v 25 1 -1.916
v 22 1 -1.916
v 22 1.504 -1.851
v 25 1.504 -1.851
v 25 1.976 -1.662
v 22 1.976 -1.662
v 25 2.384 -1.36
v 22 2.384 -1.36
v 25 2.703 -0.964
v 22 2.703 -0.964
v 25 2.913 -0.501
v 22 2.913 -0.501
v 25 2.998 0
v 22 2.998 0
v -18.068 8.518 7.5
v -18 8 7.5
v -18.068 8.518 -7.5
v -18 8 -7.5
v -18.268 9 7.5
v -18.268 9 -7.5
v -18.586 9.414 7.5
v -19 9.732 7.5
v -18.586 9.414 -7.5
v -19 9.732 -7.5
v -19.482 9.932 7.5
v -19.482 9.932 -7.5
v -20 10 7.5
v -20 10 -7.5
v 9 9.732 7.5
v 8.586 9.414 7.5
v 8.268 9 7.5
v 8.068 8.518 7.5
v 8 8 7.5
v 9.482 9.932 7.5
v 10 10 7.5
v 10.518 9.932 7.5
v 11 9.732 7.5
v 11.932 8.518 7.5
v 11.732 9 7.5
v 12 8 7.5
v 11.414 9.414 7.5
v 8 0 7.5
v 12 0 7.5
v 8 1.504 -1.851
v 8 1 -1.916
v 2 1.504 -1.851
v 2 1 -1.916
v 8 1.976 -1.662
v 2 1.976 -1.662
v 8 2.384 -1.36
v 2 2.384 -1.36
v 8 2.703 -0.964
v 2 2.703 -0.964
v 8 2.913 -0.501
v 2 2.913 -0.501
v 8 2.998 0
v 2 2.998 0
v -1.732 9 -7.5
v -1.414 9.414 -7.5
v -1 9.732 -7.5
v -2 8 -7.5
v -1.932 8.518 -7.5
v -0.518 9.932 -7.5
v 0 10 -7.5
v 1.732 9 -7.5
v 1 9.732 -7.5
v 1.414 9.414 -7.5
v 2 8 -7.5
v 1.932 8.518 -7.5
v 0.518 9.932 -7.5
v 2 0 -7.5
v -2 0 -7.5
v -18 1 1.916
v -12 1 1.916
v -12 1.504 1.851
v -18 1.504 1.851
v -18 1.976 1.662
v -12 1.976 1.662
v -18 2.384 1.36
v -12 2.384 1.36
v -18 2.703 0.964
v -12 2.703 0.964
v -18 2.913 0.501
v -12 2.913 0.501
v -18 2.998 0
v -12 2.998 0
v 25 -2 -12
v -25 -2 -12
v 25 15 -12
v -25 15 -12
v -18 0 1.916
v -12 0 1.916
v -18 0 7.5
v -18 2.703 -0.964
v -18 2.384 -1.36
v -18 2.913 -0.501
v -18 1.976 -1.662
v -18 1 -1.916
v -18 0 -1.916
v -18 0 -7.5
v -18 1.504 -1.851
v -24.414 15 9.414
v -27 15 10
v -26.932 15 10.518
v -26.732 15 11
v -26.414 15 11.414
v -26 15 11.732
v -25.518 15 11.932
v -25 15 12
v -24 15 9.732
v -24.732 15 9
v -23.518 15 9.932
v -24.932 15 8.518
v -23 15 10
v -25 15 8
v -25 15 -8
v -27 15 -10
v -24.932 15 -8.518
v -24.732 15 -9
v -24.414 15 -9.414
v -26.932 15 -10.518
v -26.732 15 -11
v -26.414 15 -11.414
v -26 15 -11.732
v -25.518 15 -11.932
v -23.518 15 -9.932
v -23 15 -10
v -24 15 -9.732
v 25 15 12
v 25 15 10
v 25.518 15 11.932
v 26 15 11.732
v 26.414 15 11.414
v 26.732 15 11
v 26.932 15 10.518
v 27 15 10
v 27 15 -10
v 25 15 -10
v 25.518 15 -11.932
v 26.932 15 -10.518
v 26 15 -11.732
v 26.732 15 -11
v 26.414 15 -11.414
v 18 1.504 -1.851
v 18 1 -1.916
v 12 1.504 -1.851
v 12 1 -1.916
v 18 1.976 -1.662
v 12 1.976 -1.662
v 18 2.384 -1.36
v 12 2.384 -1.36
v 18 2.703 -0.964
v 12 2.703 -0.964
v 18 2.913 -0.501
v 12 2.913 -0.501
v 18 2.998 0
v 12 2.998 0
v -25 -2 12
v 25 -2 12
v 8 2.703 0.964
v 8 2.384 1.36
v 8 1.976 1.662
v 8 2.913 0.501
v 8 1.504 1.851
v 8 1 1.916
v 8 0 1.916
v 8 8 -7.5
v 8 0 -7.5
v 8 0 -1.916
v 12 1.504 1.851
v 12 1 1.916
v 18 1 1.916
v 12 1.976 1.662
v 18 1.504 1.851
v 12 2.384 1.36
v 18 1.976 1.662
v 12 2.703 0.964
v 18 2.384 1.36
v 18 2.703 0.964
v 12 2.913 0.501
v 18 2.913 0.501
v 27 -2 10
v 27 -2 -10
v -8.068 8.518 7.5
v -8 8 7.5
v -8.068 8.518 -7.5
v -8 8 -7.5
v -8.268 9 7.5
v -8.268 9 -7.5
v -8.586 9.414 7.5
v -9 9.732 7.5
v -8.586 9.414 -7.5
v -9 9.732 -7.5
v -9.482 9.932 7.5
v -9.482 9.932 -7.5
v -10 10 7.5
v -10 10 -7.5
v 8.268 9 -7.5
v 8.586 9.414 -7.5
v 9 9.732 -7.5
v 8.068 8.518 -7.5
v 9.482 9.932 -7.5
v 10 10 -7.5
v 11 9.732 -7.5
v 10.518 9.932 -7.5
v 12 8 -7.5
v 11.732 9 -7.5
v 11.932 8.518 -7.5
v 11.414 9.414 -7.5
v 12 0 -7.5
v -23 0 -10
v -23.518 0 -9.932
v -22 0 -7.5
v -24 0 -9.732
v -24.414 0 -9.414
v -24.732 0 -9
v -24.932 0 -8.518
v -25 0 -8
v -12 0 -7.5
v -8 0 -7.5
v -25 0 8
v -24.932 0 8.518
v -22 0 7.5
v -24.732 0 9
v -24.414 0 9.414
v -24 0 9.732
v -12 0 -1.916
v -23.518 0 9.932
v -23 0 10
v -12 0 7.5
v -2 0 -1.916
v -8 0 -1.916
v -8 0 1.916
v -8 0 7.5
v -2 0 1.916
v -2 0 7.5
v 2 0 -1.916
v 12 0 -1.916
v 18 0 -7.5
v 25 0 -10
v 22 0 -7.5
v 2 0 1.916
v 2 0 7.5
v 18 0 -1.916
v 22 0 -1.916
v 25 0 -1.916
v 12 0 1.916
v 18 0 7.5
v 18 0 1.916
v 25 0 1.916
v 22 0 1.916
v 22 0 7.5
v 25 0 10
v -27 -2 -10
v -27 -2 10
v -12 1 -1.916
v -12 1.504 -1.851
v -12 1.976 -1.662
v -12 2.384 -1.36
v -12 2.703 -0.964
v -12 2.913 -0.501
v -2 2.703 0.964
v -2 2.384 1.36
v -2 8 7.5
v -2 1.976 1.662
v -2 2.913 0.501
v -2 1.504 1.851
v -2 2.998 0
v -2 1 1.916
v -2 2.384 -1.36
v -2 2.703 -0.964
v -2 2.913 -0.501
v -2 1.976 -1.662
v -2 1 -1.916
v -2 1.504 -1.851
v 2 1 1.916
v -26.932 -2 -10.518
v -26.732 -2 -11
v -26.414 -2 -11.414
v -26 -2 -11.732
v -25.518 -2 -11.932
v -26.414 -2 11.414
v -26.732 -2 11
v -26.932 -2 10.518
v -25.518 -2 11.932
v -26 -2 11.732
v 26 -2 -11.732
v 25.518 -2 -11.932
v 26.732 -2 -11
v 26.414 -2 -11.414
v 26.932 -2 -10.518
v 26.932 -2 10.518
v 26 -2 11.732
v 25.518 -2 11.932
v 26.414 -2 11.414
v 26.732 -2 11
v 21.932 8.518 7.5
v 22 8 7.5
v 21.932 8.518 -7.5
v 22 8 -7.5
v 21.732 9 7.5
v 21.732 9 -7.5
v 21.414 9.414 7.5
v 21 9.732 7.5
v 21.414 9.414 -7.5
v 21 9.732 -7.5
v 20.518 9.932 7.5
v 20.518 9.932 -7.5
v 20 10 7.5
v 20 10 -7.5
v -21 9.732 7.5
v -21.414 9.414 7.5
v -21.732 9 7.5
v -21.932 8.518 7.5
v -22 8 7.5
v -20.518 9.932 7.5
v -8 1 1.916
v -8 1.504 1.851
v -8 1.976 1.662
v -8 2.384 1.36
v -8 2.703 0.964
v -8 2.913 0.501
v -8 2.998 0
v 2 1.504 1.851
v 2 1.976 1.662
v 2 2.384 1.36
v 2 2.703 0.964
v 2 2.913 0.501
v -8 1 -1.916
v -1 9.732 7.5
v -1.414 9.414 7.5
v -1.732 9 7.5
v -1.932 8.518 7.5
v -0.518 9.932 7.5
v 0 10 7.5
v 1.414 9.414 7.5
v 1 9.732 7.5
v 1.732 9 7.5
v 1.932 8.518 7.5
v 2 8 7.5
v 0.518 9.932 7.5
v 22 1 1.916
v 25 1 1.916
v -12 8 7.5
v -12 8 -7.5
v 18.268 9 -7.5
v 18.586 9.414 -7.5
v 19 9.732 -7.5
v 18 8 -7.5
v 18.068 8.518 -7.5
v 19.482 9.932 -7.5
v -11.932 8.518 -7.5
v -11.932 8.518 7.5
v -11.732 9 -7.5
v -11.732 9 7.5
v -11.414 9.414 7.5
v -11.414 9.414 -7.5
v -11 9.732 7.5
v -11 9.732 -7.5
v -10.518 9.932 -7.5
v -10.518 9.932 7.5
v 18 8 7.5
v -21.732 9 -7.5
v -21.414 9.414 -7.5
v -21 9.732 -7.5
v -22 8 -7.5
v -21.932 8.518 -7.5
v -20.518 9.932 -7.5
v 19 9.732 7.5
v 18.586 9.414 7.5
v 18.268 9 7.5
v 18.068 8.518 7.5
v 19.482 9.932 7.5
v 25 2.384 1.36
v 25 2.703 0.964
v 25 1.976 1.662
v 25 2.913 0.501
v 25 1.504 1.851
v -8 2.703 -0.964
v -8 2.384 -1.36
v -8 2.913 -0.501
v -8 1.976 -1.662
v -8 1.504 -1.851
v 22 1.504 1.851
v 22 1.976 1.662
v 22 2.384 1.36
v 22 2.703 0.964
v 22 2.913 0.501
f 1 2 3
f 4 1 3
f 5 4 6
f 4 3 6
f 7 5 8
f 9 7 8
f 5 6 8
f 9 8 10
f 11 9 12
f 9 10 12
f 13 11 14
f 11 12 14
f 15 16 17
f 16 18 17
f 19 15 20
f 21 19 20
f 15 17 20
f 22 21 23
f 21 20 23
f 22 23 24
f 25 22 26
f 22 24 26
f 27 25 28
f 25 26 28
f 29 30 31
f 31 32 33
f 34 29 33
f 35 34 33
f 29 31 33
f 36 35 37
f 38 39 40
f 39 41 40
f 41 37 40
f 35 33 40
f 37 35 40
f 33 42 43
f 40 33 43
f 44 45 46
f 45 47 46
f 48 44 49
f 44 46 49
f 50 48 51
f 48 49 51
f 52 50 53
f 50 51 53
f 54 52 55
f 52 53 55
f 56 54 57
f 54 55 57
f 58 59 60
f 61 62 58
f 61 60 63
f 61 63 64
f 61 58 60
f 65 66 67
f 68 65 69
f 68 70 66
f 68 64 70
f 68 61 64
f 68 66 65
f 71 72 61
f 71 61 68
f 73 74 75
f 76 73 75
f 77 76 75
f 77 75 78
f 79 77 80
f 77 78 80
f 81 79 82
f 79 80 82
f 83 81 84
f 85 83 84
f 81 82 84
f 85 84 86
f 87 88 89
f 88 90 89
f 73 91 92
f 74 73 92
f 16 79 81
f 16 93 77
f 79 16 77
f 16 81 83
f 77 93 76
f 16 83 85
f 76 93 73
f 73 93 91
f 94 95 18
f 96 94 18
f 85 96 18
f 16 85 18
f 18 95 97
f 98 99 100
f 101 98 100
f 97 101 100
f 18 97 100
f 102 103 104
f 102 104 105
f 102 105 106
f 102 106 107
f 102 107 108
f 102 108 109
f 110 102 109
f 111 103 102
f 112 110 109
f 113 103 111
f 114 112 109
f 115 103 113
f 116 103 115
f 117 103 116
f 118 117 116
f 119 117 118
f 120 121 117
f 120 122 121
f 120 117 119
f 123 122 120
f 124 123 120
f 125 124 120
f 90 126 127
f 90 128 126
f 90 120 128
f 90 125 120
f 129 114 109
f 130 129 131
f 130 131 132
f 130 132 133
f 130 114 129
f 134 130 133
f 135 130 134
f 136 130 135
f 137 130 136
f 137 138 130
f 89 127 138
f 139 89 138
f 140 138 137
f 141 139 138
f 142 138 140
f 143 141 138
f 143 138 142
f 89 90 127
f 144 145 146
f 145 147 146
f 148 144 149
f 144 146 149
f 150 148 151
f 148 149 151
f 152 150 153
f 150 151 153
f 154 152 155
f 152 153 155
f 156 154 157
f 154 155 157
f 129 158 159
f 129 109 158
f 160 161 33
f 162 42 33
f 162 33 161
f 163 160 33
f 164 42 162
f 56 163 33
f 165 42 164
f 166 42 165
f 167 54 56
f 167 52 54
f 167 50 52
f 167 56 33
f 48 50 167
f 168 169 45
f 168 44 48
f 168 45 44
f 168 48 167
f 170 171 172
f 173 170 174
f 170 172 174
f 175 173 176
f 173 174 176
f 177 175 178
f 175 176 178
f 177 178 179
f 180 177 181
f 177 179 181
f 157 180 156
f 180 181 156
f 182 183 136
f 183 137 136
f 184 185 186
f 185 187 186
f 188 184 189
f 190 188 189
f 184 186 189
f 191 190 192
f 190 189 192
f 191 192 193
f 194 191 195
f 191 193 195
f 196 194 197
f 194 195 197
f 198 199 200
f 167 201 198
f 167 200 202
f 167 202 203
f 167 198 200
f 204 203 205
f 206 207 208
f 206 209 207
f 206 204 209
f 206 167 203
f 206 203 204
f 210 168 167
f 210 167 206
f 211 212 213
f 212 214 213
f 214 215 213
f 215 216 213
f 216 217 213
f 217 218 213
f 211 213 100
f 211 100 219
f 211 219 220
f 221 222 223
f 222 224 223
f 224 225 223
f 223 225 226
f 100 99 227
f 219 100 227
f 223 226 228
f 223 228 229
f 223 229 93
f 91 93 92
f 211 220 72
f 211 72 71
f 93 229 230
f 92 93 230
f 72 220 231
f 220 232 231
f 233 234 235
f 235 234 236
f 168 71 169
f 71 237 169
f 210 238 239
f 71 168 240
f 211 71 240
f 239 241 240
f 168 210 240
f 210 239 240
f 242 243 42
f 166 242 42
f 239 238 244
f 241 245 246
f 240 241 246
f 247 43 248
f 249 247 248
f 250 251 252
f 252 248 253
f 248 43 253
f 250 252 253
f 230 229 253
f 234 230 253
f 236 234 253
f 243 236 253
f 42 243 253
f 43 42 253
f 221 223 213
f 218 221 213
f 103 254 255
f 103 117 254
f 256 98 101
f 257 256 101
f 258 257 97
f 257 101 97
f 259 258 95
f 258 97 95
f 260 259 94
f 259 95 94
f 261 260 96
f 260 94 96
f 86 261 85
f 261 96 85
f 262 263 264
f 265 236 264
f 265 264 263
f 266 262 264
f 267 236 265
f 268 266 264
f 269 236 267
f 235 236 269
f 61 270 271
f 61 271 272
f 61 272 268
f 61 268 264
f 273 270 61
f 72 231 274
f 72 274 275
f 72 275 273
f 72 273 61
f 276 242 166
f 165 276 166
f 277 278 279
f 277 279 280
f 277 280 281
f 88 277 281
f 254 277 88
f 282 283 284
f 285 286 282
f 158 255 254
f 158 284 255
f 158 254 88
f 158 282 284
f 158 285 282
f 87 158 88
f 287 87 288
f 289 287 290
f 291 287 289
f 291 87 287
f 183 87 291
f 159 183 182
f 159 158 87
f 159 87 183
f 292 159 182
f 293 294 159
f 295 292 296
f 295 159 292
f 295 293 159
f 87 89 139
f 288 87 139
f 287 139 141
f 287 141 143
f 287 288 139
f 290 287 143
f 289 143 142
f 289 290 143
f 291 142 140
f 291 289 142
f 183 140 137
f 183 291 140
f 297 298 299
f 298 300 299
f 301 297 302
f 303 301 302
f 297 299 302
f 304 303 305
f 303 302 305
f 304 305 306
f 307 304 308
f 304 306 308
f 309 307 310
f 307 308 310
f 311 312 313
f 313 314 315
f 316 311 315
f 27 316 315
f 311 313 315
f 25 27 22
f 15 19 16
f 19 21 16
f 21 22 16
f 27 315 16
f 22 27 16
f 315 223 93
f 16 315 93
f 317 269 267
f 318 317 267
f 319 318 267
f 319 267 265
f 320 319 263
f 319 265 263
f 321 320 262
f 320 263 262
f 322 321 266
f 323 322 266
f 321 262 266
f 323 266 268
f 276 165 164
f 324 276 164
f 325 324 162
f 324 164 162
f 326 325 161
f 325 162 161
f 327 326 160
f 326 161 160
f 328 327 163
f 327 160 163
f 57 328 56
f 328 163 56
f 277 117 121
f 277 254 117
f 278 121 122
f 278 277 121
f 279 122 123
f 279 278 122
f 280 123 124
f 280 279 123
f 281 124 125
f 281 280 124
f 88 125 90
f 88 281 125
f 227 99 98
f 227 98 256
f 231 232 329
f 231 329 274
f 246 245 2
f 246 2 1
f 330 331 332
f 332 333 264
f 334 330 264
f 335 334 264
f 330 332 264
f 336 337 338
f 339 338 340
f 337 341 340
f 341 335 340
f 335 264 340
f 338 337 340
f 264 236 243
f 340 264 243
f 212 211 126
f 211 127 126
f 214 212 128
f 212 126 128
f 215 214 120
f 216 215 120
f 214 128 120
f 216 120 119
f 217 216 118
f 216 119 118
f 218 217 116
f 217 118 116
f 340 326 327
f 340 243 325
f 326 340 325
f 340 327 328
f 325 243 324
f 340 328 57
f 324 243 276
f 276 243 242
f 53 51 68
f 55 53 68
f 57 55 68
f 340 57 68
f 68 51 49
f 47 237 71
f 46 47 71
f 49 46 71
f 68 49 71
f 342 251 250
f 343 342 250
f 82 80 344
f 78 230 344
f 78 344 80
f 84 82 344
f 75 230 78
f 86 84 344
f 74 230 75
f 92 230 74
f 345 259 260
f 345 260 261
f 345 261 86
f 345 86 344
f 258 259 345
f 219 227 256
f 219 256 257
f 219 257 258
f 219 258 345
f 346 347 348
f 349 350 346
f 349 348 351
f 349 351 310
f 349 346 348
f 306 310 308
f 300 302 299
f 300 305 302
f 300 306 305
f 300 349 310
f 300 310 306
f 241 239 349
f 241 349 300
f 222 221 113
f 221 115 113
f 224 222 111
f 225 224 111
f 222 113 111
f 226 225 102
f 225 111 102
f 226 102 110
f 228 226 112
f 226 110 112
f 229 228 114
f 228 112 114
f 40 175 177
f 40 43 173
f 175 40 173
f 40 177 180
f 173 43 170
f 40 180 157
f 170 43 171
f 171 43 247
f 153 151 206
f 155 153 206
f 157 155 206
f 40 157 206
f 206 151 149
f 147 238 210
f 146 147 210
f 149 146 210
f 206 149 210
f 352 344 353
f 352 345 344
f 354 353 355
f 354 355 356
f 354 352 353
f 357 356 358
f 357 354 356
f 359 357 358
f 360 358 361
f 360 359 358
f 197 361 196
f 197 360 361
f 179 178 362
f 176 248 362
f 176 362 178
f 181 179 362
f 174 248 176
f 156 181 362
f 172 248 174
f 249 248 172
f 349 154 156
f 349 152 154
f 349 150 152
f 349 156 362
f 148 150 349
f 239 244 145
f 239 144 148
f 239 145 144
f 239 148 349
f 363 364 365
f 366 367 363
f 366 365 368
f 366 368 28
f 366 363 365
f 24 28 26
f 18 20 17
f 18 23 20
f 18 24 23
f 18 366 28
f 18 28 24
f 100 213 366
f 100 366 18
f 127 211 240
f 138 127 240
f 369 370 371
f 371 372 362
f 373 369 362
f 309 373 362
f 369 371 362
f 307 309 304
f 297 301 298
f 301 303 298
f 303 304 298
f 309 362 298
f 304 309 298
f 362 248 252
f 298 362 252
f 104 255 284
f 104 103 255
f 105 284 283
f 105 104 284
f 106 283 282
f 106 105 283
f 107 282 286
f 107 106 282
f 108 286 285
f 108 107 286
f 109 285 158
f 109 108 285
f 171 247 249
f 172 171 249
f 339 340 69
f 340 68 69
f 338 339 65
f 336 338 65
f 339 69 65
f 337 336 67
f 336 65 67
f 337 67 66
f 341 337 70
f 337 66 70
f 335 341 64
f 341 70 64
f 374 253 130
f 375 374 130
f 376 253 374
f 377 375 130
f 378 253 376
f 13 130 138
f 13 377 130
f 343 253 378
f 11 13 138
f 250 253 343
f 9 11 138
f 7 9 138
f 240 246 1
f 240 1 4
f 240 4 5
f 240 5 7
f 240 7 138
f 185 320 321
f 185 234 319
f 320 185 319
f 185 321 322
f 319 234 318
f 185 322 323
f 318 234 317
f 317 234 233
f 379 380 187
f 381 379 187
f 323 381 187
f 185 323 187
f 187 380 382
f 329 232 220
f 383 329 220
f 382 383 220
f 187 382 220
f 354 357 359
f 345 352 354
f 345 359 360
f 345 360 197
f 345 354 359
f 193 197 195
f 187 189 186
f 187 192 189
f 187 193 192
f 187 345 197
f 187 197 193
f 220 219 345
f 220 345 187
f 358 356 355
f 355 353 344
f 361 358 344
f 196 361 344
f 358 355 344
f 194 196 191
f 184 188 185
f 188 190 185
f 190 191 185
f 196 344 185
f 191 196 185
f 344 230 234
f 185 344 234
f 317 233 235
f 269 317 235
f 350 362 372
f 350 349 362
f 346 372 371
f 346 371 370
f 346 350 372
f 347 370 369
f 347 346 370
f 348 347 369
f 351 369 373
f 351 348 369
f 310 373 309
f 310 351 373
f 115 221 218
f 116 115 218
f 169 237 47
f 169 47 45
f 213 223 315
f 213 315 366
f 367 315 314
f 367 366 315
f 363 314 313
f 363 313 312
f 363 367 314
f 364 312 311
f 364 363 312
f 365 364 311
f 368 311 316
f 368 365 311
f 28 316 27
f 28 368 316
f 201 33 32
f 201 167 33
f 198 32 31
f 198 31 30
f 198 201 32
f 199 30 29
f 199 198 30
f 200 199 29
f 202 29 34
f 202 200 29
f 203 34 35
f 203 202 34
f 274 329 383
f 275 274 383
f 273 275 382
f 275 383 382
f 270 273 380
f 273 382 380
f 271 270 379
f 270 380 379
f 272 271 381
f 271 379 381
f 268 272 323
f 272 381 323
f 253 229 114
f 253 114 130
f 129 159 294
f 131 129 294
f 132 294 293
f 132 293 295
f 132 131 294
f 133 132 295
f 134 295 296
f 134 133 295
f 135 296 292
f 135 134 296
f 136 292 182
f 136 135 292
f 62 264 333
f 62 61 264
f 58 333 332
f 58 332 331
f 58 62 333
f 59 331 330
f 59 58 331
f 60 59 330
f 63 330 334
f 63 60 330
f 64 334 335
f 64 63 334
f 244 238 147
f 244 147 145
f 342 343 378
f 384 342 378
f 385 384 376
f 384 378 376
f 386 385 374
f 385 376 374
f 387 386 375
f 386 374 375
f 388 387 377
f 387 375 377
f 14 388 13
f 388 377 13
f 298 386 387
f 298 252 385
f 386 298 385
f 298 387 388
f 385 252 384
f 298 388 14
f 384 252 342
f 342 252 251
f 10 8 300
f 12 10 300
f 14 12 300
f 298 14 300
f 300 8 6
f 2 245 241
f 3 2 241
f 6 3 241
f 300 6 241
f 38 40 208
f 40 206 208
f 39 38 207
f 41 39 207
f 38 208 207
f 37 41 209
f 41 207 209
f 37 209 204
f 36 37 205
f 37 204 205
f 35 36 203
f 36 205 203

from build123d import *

# Parameters (mm, degrees)
CROQUIS7_W               = 54
CROQUIS7_H               = 24
CROQUIS7_W_2             = 50
CROQUIS7_H_2             = 20
SALIENTE_EXTRUIR7_DEPTH  = 15
CROQUIS8_W               = 54
CROQUIS8_H               = 24
SALIENTE_EXTRUIR8_DEPTH  = 2
CROQUIS9_W               = 4
CROQUIS9_H               = 15
SALIENTE_EXTRUIR10_DEPTH = 10
MATRIZL1_COUNT           = 5
MATRIZL1_PITCH           = 10
CROQUIS10_W              = 47
CROQUIS10_H              = 3.83204255
SALIENTE_EXTRUIR11_DEPTH = 3
REDONDEO1_R              = 2
REDONDEO2_R              = 2
REDONDEO3_R              = 2
REDONDEO4_R              = 2


# Some blends are built 0.0001 mm under size
with BuildPart() as part:
    # Croquis7 → Saliente-Extruir7 (new body)
    with BuildSketch(Plane(origin=(0, 0, 0), x_dir=(1, 0, 0), z_dir=(0, 1, 0))):
        Rectangle(CROQUIS7_W, CROQUIS7_H)
        Rectangle(CROQUIS7_W_2, CROQUIS7_H_2, mode=Mode.SUBTRACT)
    extrude(amount=SALIENTE_EXTRUIR7_DEPTH)

    # Croquis8 → Saliente-Extruir8 (add)
    with BuildSketch(Plane.XZ):
        Rectangle(CROQUIS8_W, CROQUIS8_H)
    extrude(amount=SALIENTE_EXTRUIR8_DEPTH)

    # Croquis9 → Saliente-Extruir10 (add)
    with BuildSketch(Plane(origin=(0, 0, 0), x_dir=(1, 0, 0), z_dir=(0, 1, 0))):
        with Locations((-20, 0)):
            Rectangle(CROQUIS9_W, CROQUIS9_H)
    saliente_extruir10 = extrude(amount=SALIENTE_EXTRUIR10_DEPTH)

    # MatrizL1: Saliente-Extruir10 ×5
    with Locations(*[(i * MATRIZL1_PITCH, 0, 0) for i in range(1, MATRIZL1_COUNT)]):
        add(saliente_extruir10)

    # Croquis10 → Saliente-Extruir11 (add)
    with BuildSketch(Plane(origin=(0, 0, 0), x_dir=(1, 0, 0), z_dir=(0, 1, 0))):
        with Locations((1.5, 0)):
            Rectangle(CROQUIS10_W, CROQUIS10_H)
    extrude(amount=SALIENTE_EXTRUIR11_DEPTH)

    # Redondeo1
    # the kernel refuses this fillet: 2 mm, written as the material it takes off along each edge
    with BuildSketch(Plane(origin=(25, 3, 1.916021275), x_dir=(0, 0, -1), z_dir=(-1, 0, 0))) as redondeo1_piece_1:
        with BuildLine():
            CenterArc((REDONDEO1_R, REDONDEO1_R), REDONDEO1_R, 180, 90)
            Line((0, REDONDEO1_R), (0, 0))
            Line((0, 0), (REDONDEO1_R, 0))
        make_face()
    extrude(amount=3, mode=Mode.SUBTRACT)
    with BuildSketch(Plane(origin=(30, 3, 1.916021275), x_dir=(0, 0, -1), z_dir=(-1, 0, 0))) as redondeo1_piece_2_section:
        with BuildLine():
            CenterArc((REDONDEO1_R, REDONDEO1_R), REDONDEO1_R, 180, 90)
            Line((0, REDONDEO1_R), (0, 0))
            Line((0, 0), (REDONDEO1_R, 0))
        make_face()
    redondeo1_piece_2 = extrude(amount=13, mode=Mode.PRIVATE)
    redondeo1_piece_2 = split(redondeo1_piece_2, bisect_by=Plane(origin=(18, 2.553264122, 1.469285397), z_dir=(-1, 0, 0)), keep=Keep.TOP, mode=Mode.PRIVATE)
    add(redondeo1_piece_2, mode=Mode.SUBTRACT)
    with BuildSketch(Plane(origin=(17, 3, -1.916021275), x_dir=(0, -1, 0), z_dir=(1, 0, 0))) as redondeo1_piece_3_section:
        with BuildLine():
            CenterArc((REDONDEO1_R, -REDONDEO1_R), REDONDEO1_R, 90, 90)
            Line((0, -REDONDEO1_R), (0, 0))
            Line((0, 0), (REDONDEO1_R, 0))
        make_face()
    redondeo1_piece_3 = extrude(amount=13, mode=Mode.PRIVATE)
    redondeo1_piece_3 = split(redondeo1_piece_3, bisect_by=Plane(origin=(18, 2.553264122, -1.469285397), z_dir=(-1, 0, 0)), keep=Keep.TOP, mode=Mode.PRIVATE)
    add(redondeo1_piece_3, mode=Mode.SUBTRACT)
    with BuildSketch(Plane(origin=(22, 3, -1.916021275), x_dir=(0, -1, 0), z_dir=(1, 0, 0))) as redondeo1_piece_4:
        with BuildLine():
            CenterArc((REDONDEO1_R, -REDONDEO1_R), REDONDEO1_R, 90, 90)
            Line((0, -REDONDEO1_R), (0, 0))
            Line((0, 0), (REDONDEO1_R, 0))
        make_face()
    extrude(amount=3, mode=Mode.SUBTRACT)
    with BuildSketch(Plane(origin=(7, 3, -1.916021275), x_dir=(0, -1, 0), z_dir=(1, 0, 0))) as redondeo1_piece_5_section:
        with BuildLine():
            CenterArc((REDONDEO1_R, -REDONDEO1_R), REDONDEO1_R, 90, 90)
            Line((0, -REDONDEO1_R), (0, 0))
            Line((0, 0), (REDONDEO1_R, 0))
        make_face()
    redondeo1_piece_5 = extrude(amount=16, mode=Mode.PRIVATE)
    redondeo1_piece_5 = split(redondeo1_piece_5, bisect_by=Plane(origin=(8, 2.553264122, -1.469285397), z_dir=(-1, 0, 0)), keep=Keep.TOP, mode=Mode.PRIVATE)
    add(redondeo1_piece_5, mode=Mode.SUBTRACT)
    with BuildSketch(Plane(origin=(12, 3, -1.916021275), x_dir=(0, -1, 0), z_dir=(1, 0, 0)), Plane(origin=(2, 3, -1.916021275), x_dir=(0, -1, 0), z_dir=(1, 0, 0)), Plane(origin=(-8, 3, -1.916021275), x_dir=(0, -1, 0), z_dir=(1, 0, 0)), Plane(origin=(-18, 3, -1.916021275), x_dir=(0, -1, 0), z_dir=(1, 0, 0))) as redondeo1_piece_6:
        with BuildLine():
            CenterArc((REDONDEO1_R, -REDONDEO1_R), REDONDEO1_R, 90, 90)
            Line((0, -REDONDEO1_R), (0, 0))
            Line((0, 0), (REDONDEO1_R, 0))
        make_face()
    extrude(amount=6, mode=Mode.SUBTRACT)
    with BuildSketch(Plane(origin=(7, 3, -1.916021275), x_dir=(0, -1, 0), z_dir=(1, 0, 0))) as redondeo1_piece_7_section:
        with BuildLine():
            CenterArc((REDONDEO1_R, -REDONDEO1_R), REDONDEO1_R, 90, 90)
            Line((0, -REDONDEO1_R), (0, 0))
            Line((0, 0), (REDONDEO1_R, 0))
        make_face()
    redondeo1_piece_7 = extrude(amount=16, mode=Mode.PRIVATE)
    redondeo1_piece_7 = split(redondeo1_piece_7, bisect_by=Plane(origin=(22, 2.553264122, -1.469285397), z_dir=(1, 0, 0)), keep=Keep.TOP, mode=Mode.PRIVATE)
    add(redondeo1_piece_7, mode=Mode.SUBTRACT)
    with BuildSketch(Plane(origin=(23, 3, 1.916021275), x_dir=(0, 0, -1), z_dir=(-1, 0, 0))) as redondeo1_piece_8_section:
        with BuildLine():
            CenterArc((REDONDEO1_R, REDONDEO1_R), REDONDEO1_R, 180, 90)
            Line((0, REDONDEO1_R), (0, 0))
            Line((0, 0), (REDONDEO1_R, 0))
        make_face()
    redondeo1_piece_8 = extrude(amount=16, mode=Mode.PRIVATE)
    redondeo1_piece_8 = split(redondeo1_piece_8, bisect_by=Plane(origin=(22, 2.553264122, 1.469285397), z_dir=(1, 0, 0)), keep=Keep.TOP, mode=Mode.PRIVATE)
    add(redondeo1_piece_8, mode=Mode.SUBTRACT)
    with BuildSketch(Plane(origin=(18, 3, 1.916021275), x_dir=(0, 0, -1), z_dir=(-1, 0, 0)), Plane(origin=(8, 3, 1.916021275), x_dir=(0, 0, -1), z_dir=(-1, 0, 0)), Plane(origin=(-2, 3, 1.916021275), x_dir=(0, 0, -1), z_dir=(-1, 0, 0)), Plane(origin=(-12, 3, 1.916021275), x_dir=(0, 0, -1), z_dir=(-1, 0, 0))) as redondeo1_piece_9:
        with BuildLine():
            CenterArc((REDONDEO1_R, REDONDEO1_R), REDONDEO1_R, 180, 90)
            Line((0, REDONDEO1_R), (0, 0))
            Line((0, 0), (REDONDEO1_R, 0))
        make_face()
    extrude(amount=6, mode=Mode.SUBTRACT)
    with BuildSketch(Plane(origin=(23, 3, 1.916021275), x_dir=(0, 0, -1), z_dir=(-1, 0, 0))) as redondeo1_piece_10_section:
        with BuildLine():
            CenterArc((REDONDEO1_R, REDONDEO1_R), REDONDEO1_R, 180, 90)
            Line((0, REDONDEO1_R), (0, 0))
            Line((0, 0), (REDONDEO1_R, 0))
        make_face()
    redondeo1_piece_10 = extrude(amount=16, mode=Mode.PRIVATE)
    redondeo1_piece_10 = split(redondeo1_piece_10, bisect_by=Plane(origin=(8, 2.553264122, 1.469285397), z_dir=(-1, 0, 0)), keep=Keep.TOP, mode=Mode.PRIVATE)
    add(redondeo1_piece_10, mode=Mode.SUBTRACT)
    with BuildSketch(Plane(origin=(13, 3, 1.916021275), x_dir=(0, 0, -1), z_dir=(-1, 0, 0))) as redondeo1_piece_11_section:
        with BuildLine():
            CenterArc((REDONDEO1_R, REDONDEO1_R), REDONDEO1_R, 180, 90)
            Line((0, REDONDEO1_R), (0, 0))
            Line((0, 0), (REDONDEO1_R, 0))
        make_face()
    redondeo1_piece_11 = extrude(amount=16, mode=Mode.PRIVATE)
    redondeo1_piece_11 = split(redondeo1_piece_11, bisect_by=Plane(origin=(12, 2.553264122, 1.469285397), z_dir=(1, 0, 0)), keep=Keep.TOP, mode=Mode.PRIVATE)
    add(redondeo1_piece_11, mode=Mode.SUBTRACT)
    with BuildSketch(Plane(origin=(13, 3, 1.916021275), x_dir=(0, 0, -1), z_dir=(-1, 0, 0))) as redondeo1_piece_12_section:
        with BuildLine():
            CenterArc((REDONDEO1_R, REDONDEO1_R), REDONDEO1_R, 180, 90)
            Line((0, REDONDEO1_R), (0, 0))
            Line((0, 0), (REDONDEO1_R, 0))
        make_face()
    redondeo1_piece_12 = extrude(amount=16, mode=Mode.PRIVATE)
    redondeo1_piece_12 = split(redondeo1_piece_12, bisect_by=Plane(origin=(-2, 2.553264122, 1.469285397), z_dir=(-1, 0, 0)), keep=Keep.TOP, mode=Mode.PRIVATE)
    add(redondeo1_piece_12, mode=Mode.SUBTRACT)
    with BuildSketch(Plane(origin=(-3, 3, -1.916021275), x_dir=(0, -1, 0), z_dir=(1, 0, 0))) as redondeo1_piece_13_section:
        with BuildLine():
            CenterArc((REDONDEO1_R, -REDONDEO1_R), REDONDEO1_R, 90, 90)
            Line((0, -REDONDEO1_R), (0, 0))
            Line((0, 0), (REDONDEO1_R, 0))
        make_face()
    redondeo1_piece_13 = extrude(amount=16, mode=Mode.PRIVATE)
    redondeo1_piece_13 = split(redondeo1_piece_13, bisect_by=Plane(origin=(-2, 2.553264122, -1.469285397), z_dir=(-1, 0, 0)), keep=Keep.TOP, mode=Mode.PRIVATE)
    add(redondeo1_piece_13, mode=Mode.SUBTRACT)
    with BuildSketch(Plane(origin=(-3, 3, -1.916021275), x_dir=(0, -1, 0), z_dir=(1, 0, 0))) as redondeo1_piece_14_section:
        with BuildLine():
            CenterArc((REDONDEO1_R, -REDONDEO1_R), REDONDEO1_R, 90, 90)
            Line((0, -REDONDEO1_R), (0, 0))
            Line((0, 0), (REDONDEO1_R, 0))
        make_face()
    redondeo1_piece_14 = extrude(amount=16, mode=Mode.PRIVATE)
    redondeo1_piece_14 = split(redondeo1_piece_14, bisect_by=Plane(origin=(12, 2.553264122, -1.469285397), z_dir=(1, 0, 0)), keep=Keep.TOP, mode=Mode.PRIVATE)
    add(redondeo1_piece_14, mode=Mode.SUBTRACT)
    with BuildSketch(Plane(origin=(3, 3, 1.916021275), x_dir=(0, 0, -1), z_dir=(-1, 0, 0))) as redondeo1_piece_15_section:
        with BuildLine():
            CenterArc((REDONDEO1_R, REDONDEO1_R), REDONDEO1_R, 180, 90)
            Line((0, REDONDEO1_R), (0, 0))
            Line((0, 0), (REDONDEO1_R, 0))
        make_face()
    redondeo1_piece_15 = extrude(amount=16, mode=Mode.PRIVATE)
    redondeo1_piece_15 = split(redondeo1_piece_15, bisect_by=Plane(origin=(2, 2.553264122, 1.469285397), z_dir=(1, 0, 0)), keep=Keep.TOP, mode=Mode.PRIVATE)
    add(redondeo1_piece_15, mode=Mode.SUBTRACT)
    with BuildSketch(Plane(origin=(3, 3, 1.916021275), x_dir=(0, 0, -1), z_dir=(-1, 0, 0))) as redondeo1_piece_16_section:
        with BuildLine():
            CenterArc((REDONDEO1_R, REDONDEO1_R), REDONDEO1_R, 180, 90)
            Line((0, REDONDEO1_R), (0, 0))
            Line((0, 0), (REDONDEO1_R, 0))
        make_face()
    redondeo1_piece_16 = extrude(amount=16, mode=Mode.PRIVATE)
    redondeo1_piece_16 = split(redondeo1_piece_16, bisect_by=Plane(origin=(-12, 2.553264122, 1.469285397), z_dir=(-1, 0, 0)), keep=Keep.TOP, mode=Mode.PRIVATE)
    add(redondeo1_piece_16, mode=Mode.SUBTRACT)
    with BuildSketch(Plane(origin=(-13, 3, -1.916021275), x_dir=(0, -1, 0), z_dir=(1, 0, 0))) as redondeo1_piece_17_section:
        with BuildLine():
            CenterArc((REDONDEO1_R, -REDONDEO1_R), REDONDEO1_R, 90, 90)
            Line((0, -REDONDEO1_R), (0, 0))
            Line((0, 0), (REDONDEO1_R, 0))
        make_face()
    redondeo1_piece_17 = extrude(amount=16, mode=Mode.PRIVATE)
    redondeo1_piece_17 = split(redondeo1_piece_17, bisect_by=Plane(origin=(-12, 2.553264122, -1.469285397), z_dir=(-1, 0, 0)), keep=Keep.TOP, mode=Mode.PRIVATE)
    add(redondeo1_piece_17, mode=Mode.SUBTRACT)
    with BuildSketch(Plane(origin=(-13, 3, -1.916021275), x_dir=(0, -1, 0), z_dir=(1, 0, 0))) as redondeo1_piece_18_section:
        with BuildLine():
            CenterArc((REDONDEO1_R, -REDONDEO1_R), REDONDEO1_R, 90, 90)
            Line((0, -REDONDEO1_R), (0, 0))
            Line((0, 0), (REDONDEO1_R, 0))
        make_face()
    redondeo1_piece_18 = extrude(amount=16, mode=Mode.PRIVATE)
    redondeo1_piece_18 = split(redondeo1_piece_18, bisect_by=Plane(origin=(2, 2.553264122, -1.469285397), z_dir=(1, 0, 0)), keep=Keep.TOP, mode=Mode.PRIVATE)
    add(redondeo1_piece_18, mode=Mode.SUBTRACT)
    with BuildSketch(Plane(origin=(-23, 3, -1.916021275), x_dir=(0, -1, 0), z_dir=(1, 0, 0))) as redondeo1_piece_19_section:
        with BuildLine():
            CenterArc((REDONDEO1_R, -REDONDEO1_R), REDONDEO1_R, 90, 90)
            Line((0, -REDONDEO1_R), (0, 0))
            Line((0, 0), (REDONDEO1_R, 0))
        make_face()
    redondeo1_piece_19 = extrude(amount=16, mode=Mode.PRIVATE)
    redondeo1_piece_19 = split(redondeo1_piece_19, bisect_by=Plane(origin=(-8, 2.553264122, -1.469285397), z_dir=(1, 0, 0)), keep=Keep.TOP, mode=Mode.PRIVATE)
    add(redondeo1_piece_19, mode=Mode.SUBTRACT)
    with BuildSketch(Plane(origin=(-7, 3, 1.916021275), x_dir=(0, 0, -1), z_dir=(-1, 0, 0))) as redondeo1_piece_20_section:
        with BuildLine():
            CenterArc((REDONDEO1_R, REDONDEO1_R), REDONDEO1_R, 180, 90)
            Line((0, REDONDEO1_R), (0, 0))
            Line((0, 0), (REDONDEO1_R, 0))
        make_face()
    redondeo1_piece_20 = extrude(amount=16, mode=Mode.PRIVATE)
    redondeo1_piece_20 = split(redondeo1_piece_20, bisect_by=Plane(origin=(-8, 2.553264122, 1.469285397), z_dir=(1, 0, 0)), keep=Keep.TOP, mode=Mode.PRIVATE)
    add(redondeo1_piece_20, mode=Mode.SUBTRACT)

    # Redondeo2
    redondeo2_edges = [part.edges().sort_by_distance(p)[0] for p in [
        (-25, 7.5, -10),
        (-25, 7.5, 10),
    ]]
    fillet(redondeo2_edges, radius=REDONDEO2_R)

    # Redondeo3
    redondeo3_edges = [part.edges().sort_by_distance(p)[0] for p in [
        (22, 10, 0),
        (18, 10, 0),
        (12, 10, 0),
        (8, 10, 0),
        (2, 10, 0),
        (-18, 10, 0),
        (-22, 10, 0),
        (-12, 10, 0),
        (-2, 10, 0),
        (-8, 10, 0),
    ]]
    fillet(redondeo3_edges, radius=REDONDEO3_R - 0.0001)  # a hair under: the kernel refuses the full size

    # Redondeo4
    redondeo4_edges = [part.edges().sort_by_distance(p)[0] for p in [
        (27, 6.5, 12),
        (-27, 6.5, 12),
        (-27, 6.5, -12),
        (27, 6.5, -12),
    ]]
    fillet(redondeo4_edges, radius=REDONDEO4_R)


solid = part.part
